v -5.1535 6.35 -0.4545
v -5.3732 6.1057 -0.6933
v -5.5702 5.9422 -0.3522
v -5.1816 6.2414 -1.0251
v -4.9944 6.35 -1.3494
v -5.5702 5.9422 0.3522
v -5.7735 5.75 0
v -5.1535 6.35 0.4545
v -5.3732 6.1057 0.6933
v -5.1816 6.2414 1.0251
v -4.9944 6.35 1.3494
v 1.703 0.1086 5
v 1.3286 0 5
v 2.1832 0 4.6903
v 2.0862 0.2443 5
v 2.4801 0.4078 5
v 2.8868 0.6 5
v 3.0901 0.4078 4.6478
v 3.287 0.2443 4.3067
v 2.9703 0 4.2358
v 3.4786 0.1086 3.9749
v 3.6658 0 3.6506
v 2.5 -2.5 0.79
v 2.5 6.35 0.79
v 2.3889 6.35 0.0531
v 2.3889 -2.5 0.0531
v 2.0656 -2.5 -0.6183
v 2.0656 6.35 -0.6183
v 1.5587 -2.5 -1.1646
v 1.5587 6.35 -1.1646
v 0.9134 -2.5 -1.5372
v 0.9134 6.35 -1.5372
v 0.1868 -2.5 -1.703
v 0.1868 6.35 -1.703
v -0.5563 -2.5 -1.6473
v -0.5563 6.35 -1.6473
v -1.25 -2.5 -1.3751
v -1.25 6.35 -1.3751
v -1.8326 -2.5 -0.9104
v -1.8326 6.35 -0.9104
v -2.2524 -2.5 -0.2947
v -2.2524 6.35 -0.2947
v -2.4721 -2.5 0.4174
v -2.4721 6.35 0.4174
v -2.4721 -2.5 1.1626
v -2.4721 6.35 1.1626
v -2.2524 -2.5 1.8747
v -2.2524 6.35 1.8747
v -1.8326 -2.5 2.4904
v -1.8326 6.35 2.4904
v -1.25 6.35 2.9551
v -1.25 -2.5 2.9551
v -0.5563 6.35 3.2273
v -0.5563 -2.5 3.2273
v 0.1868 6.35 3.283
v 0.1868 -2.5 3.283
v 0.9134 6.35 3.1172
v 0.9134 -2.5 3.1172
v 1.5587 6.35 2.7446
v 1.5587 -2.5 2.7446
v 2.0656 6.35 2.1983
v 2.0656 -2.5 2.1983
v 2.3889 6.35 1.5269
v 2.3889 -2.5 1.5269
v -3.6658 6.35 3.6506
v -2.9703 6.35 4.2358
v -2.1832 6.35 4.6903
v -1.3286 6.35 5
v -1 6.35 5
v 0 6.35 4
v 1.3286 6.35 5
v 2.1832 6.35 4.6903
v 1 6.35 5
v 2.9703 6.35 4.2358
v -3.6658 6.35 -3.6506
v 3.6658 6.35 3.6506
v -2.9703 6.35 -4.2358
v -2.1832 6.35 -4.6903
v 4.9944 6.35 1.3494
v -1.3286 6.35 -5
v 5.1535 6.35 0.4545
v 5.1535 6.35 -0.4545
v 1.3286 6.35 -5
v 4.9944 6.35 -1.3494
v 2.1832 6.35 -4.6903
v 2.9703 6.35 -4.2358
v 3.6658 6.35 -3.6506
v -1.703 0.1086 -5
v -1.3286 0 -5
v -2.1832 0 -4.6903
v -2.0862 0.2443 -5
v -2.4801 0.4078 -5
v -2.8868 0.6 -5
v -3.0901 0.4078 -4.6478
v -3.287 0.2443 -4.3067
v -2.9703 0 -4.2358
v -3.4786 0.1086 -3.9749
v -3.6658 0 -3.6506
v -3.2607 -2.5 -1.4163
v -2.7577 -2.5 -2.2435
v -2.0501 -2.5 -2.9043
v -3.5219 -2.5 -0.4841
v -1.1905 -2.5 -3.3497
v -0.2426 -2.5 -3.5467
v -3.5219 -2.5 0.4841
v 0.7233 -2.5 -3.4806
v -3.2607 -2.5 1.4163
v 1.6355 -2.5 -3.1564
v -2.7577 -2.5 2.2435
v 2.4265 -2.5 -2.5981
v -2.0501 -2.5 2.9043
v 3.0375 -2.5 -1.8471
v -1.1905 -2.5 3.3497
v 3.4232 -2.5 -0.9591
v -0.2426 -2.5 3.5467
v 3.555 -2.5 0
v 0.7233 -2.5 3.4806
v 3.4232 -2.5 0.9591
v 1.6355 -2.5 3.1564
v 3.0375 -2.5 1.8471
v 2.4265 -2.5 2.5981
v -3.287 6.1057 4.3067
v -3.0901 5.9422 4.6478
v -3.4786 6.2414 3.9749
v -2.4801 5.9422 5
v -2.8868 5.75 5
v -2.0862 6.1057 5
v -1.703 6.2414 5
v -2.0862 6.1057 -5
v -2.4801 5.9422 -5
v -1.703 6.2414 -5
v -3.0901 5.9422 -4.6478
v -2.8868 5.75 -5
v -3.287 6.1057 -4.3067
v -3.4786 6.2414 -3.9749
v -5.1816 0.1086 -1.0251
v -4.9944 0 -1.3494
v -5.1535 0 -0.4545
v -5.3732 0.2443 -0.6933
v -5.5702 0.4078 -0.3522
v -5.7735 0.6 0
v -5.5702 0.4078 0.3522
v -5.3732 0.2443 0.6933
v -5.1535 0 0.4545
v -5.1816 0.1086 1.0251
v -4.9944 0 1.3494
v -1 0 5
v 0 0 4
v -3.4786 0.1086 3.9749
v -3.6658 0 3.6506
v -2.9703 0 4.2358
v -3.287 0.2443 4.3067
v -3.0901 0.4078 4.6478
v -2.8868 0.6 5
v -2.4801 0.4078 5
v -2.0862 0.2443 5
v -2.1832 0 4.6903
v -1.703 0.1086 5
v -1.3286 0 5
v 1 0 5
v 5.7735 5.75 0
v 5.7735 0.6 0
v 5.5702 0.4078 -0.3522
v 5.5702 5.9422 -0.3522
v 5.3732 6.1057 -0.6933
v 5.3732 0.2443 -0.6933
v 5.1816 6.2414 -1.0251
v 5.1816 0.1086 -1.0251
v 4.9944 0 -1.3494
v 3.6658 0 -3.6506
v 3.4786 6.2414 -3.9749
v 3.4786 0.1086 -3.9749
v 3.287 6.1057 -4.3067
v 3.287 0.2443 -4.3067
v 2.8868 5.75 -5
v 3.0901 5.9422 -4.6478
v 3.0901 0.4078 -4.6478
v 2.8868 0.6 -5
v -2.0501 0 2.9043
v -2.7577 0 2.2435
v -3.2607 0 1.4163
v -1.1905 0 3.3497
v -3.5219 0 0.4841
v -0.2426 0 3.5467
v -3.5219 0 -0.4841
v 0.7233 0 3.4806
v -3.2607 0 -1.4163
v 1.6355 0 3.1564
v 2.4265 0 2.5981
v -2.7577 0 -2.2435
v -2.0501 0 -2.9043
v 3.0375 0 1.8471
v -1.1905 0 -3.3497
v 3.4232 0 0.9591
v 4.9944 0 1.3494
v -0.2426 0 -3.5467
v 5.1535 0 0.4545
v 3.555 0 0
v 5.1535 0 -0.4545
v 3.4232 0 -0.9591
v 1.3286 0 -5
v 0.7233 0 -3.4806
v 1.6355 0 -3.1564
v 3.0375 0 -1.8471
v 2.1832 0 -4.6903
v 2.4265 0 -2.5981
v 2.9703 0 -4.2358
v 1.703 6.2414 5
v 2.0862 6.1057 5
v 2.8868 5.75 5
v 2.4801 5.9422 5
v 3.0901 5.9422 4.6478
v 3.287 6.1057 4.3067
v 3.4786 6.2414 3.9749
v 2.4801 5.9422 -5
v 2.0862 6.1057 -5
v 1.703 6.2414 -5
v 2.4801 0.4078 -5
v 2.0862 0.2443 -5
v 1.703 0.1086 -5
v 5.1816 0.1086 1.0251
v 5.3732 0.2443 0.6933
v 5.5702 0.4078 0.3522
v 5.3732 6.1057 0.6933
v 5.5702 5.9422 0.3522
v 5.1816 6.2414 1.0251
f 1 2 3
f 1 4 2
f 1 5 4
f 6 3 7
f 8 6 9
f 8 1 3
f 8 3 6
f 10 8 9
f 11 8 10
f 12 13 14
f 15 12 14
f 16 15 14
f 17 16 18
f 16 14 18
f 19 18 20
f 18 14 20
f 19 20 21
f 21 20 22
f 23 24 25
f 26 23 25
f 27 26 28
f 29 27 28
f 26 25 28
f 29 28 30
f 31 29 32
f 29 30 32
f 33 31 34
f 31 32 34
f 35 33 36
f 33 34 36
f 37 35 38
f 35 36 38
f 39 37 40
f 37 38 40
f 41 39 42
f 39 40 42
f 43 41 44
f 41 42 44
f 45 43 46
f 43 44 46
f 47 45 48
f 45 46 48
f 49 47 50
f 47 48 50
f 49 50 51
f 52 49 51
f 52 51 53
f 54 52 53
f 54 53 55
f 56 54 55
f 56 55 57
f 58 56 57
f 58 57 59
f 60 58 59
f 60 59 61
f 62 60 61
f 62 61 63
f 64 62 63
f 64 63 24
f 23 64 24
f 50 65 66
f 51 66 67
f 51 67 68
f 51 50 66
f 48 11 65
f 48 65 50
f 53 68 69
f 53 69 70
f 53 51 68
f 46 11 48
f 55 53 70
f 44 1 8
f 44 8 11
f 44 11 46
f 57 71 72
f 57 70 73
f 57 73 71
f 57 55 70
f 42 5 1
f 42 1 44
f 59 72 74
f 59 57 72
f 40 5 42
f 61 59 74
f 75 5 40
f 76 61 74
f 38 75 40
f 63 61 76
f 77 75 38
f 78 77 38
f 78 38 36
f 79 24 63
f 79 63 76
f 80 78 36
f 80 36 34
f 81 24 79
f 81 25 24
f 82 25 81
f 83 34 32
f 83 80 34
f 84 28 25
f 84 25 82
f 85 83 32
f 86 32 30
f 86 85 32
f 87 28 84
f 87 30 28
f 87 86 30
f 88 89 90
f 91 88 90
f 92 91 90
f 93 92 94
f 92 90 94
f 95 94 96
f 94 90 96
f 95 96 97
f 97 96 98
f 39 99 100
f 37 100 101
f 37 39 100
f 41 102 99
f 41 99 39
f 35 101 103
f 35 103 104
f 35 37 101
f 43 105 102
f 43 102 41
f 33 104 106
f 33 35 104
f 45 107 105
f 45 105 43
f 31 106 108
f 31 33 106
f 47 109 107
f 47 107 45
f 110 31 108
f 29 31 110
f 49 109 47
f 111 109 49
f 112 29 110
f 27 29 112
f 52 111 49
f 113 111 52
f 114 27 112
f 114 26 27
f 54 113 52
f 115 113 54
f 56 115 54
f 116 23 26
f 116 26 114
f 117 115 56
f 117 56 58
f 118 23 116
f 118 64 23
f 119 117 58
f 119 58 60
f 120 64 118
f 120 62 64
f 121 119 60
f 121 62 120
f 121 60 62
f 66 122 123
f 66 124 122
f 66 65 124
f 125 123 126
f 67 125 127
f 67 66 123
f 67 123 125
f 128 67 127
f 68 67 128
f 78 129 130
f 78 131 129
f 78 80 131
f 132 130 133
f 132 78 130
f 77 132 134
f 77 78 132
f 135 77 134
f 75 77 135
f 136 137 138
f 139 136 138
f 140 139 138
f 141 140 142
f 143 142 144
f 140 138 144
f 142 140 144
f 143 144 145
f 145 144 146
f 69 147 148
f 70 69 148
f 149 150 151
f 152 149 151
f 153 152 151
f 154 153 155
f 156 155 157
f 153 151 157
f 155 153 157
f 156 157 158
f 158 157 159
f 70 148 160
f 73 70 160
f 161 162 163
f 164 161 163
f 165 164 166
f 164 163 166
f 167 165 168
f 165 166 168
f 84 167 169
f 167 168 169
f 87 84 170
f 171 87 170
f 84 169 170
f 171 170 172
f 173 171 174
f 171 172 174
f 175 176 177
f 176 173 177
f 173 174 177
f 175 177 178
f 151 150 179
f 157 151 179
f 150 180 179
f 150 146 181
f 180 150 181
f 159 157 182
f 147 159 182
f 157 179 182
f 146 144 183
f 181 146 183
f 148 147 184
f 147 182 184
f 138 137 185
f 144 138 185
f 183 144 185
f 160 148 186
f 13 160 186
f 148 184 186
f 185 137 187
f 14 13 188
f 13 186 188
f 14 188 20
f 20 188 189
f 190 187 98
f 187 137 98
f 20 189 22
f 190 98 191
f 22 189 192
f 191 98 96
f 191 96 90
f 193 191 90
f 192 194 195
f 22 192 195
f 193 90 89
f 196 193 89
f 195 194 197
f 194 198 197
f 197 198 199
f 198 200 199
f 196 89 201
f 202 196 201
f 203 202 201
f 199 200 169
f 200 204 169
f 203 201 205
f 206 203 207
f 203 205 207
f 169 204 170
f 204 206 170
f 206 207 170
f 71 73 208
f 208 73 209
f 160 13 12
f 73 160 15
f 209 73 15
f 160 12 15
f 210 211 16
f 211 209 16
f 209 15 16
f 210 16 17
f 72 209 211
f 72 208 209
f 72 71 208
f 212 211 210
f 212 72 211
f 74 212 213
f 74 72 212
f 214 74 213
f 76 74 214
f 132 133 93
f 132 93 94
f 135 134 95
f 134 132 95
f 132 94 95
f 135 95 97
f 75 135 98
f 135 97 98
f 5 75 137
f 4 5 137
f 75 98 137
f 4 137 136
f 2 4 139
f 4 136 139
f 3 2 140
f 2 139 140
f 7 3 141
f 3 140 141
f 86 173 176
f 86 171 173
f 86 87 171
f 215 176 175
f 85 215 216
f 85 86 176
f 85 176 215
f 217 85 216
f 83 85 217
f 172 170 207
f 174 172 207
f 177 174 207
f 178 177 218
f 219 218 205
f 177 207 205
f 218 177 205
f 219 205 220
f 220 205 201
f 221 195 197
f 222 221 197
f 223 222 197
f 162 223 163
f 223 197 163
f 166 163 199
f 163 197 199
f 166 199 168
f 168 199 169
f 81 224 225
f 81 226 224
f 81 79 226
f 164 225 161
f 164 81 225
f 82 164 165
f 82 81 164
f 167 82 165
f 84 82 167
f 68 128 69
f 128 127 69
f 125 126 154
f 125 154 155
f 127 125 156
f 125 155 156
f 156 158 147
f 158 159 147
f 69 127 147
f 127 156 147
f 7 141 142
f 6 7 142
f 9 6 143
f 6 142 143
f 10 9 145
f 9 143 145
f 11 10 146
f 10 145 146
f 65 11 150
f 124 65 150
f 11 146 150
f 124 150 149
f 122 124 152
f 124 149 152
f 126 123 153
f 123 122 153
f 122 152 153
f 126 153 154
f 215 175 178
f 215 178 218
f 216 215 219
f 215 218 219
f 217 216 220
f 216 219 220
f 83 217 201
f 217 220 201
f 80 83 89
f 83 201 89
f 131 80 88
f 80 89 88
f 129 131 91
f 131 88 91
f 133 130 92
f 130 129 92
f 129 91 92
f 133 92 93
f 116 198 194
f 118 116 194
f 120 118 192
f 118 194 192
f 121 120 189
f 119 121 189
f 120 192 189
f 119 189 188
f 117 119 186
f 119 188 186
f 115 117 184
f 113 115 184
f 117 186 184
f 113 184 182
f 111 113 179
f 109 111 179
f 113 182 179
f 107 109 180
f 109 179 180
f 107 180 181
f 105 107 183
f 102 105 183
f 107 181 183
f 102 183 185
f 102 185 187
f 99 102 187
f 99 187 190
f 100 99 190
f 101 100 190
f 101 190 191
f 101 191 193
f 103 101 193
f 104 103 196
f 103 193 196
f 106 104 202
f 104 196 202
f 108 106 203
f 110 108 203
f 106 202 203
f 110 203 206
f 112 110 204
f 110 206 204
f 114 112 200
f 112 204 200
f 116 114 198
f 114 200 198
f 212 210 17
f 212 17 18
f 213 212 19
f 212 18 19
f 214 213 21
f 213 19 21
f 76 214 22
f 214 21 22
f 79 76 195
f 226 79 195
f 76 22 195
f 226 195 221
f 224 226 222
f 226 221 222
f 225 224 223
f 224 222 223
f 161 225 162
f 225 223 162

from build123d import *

# Parameters (mm, degrees)
BOSS_EXTRUDE1_DEPTH = 6.35
SKETCH3_R           = 3.555
BOSS_EXTRUDE3_DEPTH = 2.5
SKETCH4_R           = 2.5
CUT_EXTRUDE1_DEPTH  = 9.85
CUT_EXTRUDE2_DEPTH  = 7.35


with BuildPart() as part:
    # Sketch1 → Boss-Extrude1 (new body)
    with BuildSketch(Plane(origin=(0, 0, 0), x_dir=(1, 0, 0), z_dir=(0, 1, 0))):
        Polygon((5.773502692, 0), (2.886751346, 5), (-2.886751346, 5), (-5.773502692, 0), (-2.886751346, -5), (2.886751346, -5), align=None)
    extrude(amount=BOSS_EXTRUDE1_DEPTH)

    # Sketch3 → Boss-Extrude3 (add)
    with BuildSketch(Plane.XZ):
        Circle(SKETCH3_R)
    extrude(amount=BOSS_EXTRUDE3_DEPTH)

    # Sketch4 → Cut-Extrude1 (cut, through all)
    with BuildSketch(Plane(origin=(0, 6.35, 0), x_dir=(1, 0, 0), z_dir=(0, 1, 0))):
        with Locations((0, -0.79)):
            Circle(SKETCH4_R)
    extrude(amount=-CUT_EXTRUDE1_DEPTH, mode=Mode.SUBTRACT)

    # Sketch5 → Cut-Extrude2 (cut, through all)
    with BuildSketch(Plane(origin=(0, 0, 0), x_dir=(-1, 0, 0), z_dir=(0, -1, 0))):
        Polygon((-1, -5), (1, -5), (0, -4), align=None)
    extrude(amount=-CUT_EXTRUDE2_DEPTH, mode=Mode.SUBTRACT)

    # Sketch6 → Cut-Revolve1 (revolve, cut)
    with BuildSketch(Plane.XY):
        Polygon((5.173502692, 6.35), (5.773502692, 6.35), (5.773502692, 5.75), align=None)
        Polygon((5.773502692, 0.6), (5.173502692, 0), (5.773502692, 0), align=None)
    revolve(axis=Axis((0, 0, 0), (0, 1, 0)), mode=Mode.SUBTRACT)


solid = part.part
